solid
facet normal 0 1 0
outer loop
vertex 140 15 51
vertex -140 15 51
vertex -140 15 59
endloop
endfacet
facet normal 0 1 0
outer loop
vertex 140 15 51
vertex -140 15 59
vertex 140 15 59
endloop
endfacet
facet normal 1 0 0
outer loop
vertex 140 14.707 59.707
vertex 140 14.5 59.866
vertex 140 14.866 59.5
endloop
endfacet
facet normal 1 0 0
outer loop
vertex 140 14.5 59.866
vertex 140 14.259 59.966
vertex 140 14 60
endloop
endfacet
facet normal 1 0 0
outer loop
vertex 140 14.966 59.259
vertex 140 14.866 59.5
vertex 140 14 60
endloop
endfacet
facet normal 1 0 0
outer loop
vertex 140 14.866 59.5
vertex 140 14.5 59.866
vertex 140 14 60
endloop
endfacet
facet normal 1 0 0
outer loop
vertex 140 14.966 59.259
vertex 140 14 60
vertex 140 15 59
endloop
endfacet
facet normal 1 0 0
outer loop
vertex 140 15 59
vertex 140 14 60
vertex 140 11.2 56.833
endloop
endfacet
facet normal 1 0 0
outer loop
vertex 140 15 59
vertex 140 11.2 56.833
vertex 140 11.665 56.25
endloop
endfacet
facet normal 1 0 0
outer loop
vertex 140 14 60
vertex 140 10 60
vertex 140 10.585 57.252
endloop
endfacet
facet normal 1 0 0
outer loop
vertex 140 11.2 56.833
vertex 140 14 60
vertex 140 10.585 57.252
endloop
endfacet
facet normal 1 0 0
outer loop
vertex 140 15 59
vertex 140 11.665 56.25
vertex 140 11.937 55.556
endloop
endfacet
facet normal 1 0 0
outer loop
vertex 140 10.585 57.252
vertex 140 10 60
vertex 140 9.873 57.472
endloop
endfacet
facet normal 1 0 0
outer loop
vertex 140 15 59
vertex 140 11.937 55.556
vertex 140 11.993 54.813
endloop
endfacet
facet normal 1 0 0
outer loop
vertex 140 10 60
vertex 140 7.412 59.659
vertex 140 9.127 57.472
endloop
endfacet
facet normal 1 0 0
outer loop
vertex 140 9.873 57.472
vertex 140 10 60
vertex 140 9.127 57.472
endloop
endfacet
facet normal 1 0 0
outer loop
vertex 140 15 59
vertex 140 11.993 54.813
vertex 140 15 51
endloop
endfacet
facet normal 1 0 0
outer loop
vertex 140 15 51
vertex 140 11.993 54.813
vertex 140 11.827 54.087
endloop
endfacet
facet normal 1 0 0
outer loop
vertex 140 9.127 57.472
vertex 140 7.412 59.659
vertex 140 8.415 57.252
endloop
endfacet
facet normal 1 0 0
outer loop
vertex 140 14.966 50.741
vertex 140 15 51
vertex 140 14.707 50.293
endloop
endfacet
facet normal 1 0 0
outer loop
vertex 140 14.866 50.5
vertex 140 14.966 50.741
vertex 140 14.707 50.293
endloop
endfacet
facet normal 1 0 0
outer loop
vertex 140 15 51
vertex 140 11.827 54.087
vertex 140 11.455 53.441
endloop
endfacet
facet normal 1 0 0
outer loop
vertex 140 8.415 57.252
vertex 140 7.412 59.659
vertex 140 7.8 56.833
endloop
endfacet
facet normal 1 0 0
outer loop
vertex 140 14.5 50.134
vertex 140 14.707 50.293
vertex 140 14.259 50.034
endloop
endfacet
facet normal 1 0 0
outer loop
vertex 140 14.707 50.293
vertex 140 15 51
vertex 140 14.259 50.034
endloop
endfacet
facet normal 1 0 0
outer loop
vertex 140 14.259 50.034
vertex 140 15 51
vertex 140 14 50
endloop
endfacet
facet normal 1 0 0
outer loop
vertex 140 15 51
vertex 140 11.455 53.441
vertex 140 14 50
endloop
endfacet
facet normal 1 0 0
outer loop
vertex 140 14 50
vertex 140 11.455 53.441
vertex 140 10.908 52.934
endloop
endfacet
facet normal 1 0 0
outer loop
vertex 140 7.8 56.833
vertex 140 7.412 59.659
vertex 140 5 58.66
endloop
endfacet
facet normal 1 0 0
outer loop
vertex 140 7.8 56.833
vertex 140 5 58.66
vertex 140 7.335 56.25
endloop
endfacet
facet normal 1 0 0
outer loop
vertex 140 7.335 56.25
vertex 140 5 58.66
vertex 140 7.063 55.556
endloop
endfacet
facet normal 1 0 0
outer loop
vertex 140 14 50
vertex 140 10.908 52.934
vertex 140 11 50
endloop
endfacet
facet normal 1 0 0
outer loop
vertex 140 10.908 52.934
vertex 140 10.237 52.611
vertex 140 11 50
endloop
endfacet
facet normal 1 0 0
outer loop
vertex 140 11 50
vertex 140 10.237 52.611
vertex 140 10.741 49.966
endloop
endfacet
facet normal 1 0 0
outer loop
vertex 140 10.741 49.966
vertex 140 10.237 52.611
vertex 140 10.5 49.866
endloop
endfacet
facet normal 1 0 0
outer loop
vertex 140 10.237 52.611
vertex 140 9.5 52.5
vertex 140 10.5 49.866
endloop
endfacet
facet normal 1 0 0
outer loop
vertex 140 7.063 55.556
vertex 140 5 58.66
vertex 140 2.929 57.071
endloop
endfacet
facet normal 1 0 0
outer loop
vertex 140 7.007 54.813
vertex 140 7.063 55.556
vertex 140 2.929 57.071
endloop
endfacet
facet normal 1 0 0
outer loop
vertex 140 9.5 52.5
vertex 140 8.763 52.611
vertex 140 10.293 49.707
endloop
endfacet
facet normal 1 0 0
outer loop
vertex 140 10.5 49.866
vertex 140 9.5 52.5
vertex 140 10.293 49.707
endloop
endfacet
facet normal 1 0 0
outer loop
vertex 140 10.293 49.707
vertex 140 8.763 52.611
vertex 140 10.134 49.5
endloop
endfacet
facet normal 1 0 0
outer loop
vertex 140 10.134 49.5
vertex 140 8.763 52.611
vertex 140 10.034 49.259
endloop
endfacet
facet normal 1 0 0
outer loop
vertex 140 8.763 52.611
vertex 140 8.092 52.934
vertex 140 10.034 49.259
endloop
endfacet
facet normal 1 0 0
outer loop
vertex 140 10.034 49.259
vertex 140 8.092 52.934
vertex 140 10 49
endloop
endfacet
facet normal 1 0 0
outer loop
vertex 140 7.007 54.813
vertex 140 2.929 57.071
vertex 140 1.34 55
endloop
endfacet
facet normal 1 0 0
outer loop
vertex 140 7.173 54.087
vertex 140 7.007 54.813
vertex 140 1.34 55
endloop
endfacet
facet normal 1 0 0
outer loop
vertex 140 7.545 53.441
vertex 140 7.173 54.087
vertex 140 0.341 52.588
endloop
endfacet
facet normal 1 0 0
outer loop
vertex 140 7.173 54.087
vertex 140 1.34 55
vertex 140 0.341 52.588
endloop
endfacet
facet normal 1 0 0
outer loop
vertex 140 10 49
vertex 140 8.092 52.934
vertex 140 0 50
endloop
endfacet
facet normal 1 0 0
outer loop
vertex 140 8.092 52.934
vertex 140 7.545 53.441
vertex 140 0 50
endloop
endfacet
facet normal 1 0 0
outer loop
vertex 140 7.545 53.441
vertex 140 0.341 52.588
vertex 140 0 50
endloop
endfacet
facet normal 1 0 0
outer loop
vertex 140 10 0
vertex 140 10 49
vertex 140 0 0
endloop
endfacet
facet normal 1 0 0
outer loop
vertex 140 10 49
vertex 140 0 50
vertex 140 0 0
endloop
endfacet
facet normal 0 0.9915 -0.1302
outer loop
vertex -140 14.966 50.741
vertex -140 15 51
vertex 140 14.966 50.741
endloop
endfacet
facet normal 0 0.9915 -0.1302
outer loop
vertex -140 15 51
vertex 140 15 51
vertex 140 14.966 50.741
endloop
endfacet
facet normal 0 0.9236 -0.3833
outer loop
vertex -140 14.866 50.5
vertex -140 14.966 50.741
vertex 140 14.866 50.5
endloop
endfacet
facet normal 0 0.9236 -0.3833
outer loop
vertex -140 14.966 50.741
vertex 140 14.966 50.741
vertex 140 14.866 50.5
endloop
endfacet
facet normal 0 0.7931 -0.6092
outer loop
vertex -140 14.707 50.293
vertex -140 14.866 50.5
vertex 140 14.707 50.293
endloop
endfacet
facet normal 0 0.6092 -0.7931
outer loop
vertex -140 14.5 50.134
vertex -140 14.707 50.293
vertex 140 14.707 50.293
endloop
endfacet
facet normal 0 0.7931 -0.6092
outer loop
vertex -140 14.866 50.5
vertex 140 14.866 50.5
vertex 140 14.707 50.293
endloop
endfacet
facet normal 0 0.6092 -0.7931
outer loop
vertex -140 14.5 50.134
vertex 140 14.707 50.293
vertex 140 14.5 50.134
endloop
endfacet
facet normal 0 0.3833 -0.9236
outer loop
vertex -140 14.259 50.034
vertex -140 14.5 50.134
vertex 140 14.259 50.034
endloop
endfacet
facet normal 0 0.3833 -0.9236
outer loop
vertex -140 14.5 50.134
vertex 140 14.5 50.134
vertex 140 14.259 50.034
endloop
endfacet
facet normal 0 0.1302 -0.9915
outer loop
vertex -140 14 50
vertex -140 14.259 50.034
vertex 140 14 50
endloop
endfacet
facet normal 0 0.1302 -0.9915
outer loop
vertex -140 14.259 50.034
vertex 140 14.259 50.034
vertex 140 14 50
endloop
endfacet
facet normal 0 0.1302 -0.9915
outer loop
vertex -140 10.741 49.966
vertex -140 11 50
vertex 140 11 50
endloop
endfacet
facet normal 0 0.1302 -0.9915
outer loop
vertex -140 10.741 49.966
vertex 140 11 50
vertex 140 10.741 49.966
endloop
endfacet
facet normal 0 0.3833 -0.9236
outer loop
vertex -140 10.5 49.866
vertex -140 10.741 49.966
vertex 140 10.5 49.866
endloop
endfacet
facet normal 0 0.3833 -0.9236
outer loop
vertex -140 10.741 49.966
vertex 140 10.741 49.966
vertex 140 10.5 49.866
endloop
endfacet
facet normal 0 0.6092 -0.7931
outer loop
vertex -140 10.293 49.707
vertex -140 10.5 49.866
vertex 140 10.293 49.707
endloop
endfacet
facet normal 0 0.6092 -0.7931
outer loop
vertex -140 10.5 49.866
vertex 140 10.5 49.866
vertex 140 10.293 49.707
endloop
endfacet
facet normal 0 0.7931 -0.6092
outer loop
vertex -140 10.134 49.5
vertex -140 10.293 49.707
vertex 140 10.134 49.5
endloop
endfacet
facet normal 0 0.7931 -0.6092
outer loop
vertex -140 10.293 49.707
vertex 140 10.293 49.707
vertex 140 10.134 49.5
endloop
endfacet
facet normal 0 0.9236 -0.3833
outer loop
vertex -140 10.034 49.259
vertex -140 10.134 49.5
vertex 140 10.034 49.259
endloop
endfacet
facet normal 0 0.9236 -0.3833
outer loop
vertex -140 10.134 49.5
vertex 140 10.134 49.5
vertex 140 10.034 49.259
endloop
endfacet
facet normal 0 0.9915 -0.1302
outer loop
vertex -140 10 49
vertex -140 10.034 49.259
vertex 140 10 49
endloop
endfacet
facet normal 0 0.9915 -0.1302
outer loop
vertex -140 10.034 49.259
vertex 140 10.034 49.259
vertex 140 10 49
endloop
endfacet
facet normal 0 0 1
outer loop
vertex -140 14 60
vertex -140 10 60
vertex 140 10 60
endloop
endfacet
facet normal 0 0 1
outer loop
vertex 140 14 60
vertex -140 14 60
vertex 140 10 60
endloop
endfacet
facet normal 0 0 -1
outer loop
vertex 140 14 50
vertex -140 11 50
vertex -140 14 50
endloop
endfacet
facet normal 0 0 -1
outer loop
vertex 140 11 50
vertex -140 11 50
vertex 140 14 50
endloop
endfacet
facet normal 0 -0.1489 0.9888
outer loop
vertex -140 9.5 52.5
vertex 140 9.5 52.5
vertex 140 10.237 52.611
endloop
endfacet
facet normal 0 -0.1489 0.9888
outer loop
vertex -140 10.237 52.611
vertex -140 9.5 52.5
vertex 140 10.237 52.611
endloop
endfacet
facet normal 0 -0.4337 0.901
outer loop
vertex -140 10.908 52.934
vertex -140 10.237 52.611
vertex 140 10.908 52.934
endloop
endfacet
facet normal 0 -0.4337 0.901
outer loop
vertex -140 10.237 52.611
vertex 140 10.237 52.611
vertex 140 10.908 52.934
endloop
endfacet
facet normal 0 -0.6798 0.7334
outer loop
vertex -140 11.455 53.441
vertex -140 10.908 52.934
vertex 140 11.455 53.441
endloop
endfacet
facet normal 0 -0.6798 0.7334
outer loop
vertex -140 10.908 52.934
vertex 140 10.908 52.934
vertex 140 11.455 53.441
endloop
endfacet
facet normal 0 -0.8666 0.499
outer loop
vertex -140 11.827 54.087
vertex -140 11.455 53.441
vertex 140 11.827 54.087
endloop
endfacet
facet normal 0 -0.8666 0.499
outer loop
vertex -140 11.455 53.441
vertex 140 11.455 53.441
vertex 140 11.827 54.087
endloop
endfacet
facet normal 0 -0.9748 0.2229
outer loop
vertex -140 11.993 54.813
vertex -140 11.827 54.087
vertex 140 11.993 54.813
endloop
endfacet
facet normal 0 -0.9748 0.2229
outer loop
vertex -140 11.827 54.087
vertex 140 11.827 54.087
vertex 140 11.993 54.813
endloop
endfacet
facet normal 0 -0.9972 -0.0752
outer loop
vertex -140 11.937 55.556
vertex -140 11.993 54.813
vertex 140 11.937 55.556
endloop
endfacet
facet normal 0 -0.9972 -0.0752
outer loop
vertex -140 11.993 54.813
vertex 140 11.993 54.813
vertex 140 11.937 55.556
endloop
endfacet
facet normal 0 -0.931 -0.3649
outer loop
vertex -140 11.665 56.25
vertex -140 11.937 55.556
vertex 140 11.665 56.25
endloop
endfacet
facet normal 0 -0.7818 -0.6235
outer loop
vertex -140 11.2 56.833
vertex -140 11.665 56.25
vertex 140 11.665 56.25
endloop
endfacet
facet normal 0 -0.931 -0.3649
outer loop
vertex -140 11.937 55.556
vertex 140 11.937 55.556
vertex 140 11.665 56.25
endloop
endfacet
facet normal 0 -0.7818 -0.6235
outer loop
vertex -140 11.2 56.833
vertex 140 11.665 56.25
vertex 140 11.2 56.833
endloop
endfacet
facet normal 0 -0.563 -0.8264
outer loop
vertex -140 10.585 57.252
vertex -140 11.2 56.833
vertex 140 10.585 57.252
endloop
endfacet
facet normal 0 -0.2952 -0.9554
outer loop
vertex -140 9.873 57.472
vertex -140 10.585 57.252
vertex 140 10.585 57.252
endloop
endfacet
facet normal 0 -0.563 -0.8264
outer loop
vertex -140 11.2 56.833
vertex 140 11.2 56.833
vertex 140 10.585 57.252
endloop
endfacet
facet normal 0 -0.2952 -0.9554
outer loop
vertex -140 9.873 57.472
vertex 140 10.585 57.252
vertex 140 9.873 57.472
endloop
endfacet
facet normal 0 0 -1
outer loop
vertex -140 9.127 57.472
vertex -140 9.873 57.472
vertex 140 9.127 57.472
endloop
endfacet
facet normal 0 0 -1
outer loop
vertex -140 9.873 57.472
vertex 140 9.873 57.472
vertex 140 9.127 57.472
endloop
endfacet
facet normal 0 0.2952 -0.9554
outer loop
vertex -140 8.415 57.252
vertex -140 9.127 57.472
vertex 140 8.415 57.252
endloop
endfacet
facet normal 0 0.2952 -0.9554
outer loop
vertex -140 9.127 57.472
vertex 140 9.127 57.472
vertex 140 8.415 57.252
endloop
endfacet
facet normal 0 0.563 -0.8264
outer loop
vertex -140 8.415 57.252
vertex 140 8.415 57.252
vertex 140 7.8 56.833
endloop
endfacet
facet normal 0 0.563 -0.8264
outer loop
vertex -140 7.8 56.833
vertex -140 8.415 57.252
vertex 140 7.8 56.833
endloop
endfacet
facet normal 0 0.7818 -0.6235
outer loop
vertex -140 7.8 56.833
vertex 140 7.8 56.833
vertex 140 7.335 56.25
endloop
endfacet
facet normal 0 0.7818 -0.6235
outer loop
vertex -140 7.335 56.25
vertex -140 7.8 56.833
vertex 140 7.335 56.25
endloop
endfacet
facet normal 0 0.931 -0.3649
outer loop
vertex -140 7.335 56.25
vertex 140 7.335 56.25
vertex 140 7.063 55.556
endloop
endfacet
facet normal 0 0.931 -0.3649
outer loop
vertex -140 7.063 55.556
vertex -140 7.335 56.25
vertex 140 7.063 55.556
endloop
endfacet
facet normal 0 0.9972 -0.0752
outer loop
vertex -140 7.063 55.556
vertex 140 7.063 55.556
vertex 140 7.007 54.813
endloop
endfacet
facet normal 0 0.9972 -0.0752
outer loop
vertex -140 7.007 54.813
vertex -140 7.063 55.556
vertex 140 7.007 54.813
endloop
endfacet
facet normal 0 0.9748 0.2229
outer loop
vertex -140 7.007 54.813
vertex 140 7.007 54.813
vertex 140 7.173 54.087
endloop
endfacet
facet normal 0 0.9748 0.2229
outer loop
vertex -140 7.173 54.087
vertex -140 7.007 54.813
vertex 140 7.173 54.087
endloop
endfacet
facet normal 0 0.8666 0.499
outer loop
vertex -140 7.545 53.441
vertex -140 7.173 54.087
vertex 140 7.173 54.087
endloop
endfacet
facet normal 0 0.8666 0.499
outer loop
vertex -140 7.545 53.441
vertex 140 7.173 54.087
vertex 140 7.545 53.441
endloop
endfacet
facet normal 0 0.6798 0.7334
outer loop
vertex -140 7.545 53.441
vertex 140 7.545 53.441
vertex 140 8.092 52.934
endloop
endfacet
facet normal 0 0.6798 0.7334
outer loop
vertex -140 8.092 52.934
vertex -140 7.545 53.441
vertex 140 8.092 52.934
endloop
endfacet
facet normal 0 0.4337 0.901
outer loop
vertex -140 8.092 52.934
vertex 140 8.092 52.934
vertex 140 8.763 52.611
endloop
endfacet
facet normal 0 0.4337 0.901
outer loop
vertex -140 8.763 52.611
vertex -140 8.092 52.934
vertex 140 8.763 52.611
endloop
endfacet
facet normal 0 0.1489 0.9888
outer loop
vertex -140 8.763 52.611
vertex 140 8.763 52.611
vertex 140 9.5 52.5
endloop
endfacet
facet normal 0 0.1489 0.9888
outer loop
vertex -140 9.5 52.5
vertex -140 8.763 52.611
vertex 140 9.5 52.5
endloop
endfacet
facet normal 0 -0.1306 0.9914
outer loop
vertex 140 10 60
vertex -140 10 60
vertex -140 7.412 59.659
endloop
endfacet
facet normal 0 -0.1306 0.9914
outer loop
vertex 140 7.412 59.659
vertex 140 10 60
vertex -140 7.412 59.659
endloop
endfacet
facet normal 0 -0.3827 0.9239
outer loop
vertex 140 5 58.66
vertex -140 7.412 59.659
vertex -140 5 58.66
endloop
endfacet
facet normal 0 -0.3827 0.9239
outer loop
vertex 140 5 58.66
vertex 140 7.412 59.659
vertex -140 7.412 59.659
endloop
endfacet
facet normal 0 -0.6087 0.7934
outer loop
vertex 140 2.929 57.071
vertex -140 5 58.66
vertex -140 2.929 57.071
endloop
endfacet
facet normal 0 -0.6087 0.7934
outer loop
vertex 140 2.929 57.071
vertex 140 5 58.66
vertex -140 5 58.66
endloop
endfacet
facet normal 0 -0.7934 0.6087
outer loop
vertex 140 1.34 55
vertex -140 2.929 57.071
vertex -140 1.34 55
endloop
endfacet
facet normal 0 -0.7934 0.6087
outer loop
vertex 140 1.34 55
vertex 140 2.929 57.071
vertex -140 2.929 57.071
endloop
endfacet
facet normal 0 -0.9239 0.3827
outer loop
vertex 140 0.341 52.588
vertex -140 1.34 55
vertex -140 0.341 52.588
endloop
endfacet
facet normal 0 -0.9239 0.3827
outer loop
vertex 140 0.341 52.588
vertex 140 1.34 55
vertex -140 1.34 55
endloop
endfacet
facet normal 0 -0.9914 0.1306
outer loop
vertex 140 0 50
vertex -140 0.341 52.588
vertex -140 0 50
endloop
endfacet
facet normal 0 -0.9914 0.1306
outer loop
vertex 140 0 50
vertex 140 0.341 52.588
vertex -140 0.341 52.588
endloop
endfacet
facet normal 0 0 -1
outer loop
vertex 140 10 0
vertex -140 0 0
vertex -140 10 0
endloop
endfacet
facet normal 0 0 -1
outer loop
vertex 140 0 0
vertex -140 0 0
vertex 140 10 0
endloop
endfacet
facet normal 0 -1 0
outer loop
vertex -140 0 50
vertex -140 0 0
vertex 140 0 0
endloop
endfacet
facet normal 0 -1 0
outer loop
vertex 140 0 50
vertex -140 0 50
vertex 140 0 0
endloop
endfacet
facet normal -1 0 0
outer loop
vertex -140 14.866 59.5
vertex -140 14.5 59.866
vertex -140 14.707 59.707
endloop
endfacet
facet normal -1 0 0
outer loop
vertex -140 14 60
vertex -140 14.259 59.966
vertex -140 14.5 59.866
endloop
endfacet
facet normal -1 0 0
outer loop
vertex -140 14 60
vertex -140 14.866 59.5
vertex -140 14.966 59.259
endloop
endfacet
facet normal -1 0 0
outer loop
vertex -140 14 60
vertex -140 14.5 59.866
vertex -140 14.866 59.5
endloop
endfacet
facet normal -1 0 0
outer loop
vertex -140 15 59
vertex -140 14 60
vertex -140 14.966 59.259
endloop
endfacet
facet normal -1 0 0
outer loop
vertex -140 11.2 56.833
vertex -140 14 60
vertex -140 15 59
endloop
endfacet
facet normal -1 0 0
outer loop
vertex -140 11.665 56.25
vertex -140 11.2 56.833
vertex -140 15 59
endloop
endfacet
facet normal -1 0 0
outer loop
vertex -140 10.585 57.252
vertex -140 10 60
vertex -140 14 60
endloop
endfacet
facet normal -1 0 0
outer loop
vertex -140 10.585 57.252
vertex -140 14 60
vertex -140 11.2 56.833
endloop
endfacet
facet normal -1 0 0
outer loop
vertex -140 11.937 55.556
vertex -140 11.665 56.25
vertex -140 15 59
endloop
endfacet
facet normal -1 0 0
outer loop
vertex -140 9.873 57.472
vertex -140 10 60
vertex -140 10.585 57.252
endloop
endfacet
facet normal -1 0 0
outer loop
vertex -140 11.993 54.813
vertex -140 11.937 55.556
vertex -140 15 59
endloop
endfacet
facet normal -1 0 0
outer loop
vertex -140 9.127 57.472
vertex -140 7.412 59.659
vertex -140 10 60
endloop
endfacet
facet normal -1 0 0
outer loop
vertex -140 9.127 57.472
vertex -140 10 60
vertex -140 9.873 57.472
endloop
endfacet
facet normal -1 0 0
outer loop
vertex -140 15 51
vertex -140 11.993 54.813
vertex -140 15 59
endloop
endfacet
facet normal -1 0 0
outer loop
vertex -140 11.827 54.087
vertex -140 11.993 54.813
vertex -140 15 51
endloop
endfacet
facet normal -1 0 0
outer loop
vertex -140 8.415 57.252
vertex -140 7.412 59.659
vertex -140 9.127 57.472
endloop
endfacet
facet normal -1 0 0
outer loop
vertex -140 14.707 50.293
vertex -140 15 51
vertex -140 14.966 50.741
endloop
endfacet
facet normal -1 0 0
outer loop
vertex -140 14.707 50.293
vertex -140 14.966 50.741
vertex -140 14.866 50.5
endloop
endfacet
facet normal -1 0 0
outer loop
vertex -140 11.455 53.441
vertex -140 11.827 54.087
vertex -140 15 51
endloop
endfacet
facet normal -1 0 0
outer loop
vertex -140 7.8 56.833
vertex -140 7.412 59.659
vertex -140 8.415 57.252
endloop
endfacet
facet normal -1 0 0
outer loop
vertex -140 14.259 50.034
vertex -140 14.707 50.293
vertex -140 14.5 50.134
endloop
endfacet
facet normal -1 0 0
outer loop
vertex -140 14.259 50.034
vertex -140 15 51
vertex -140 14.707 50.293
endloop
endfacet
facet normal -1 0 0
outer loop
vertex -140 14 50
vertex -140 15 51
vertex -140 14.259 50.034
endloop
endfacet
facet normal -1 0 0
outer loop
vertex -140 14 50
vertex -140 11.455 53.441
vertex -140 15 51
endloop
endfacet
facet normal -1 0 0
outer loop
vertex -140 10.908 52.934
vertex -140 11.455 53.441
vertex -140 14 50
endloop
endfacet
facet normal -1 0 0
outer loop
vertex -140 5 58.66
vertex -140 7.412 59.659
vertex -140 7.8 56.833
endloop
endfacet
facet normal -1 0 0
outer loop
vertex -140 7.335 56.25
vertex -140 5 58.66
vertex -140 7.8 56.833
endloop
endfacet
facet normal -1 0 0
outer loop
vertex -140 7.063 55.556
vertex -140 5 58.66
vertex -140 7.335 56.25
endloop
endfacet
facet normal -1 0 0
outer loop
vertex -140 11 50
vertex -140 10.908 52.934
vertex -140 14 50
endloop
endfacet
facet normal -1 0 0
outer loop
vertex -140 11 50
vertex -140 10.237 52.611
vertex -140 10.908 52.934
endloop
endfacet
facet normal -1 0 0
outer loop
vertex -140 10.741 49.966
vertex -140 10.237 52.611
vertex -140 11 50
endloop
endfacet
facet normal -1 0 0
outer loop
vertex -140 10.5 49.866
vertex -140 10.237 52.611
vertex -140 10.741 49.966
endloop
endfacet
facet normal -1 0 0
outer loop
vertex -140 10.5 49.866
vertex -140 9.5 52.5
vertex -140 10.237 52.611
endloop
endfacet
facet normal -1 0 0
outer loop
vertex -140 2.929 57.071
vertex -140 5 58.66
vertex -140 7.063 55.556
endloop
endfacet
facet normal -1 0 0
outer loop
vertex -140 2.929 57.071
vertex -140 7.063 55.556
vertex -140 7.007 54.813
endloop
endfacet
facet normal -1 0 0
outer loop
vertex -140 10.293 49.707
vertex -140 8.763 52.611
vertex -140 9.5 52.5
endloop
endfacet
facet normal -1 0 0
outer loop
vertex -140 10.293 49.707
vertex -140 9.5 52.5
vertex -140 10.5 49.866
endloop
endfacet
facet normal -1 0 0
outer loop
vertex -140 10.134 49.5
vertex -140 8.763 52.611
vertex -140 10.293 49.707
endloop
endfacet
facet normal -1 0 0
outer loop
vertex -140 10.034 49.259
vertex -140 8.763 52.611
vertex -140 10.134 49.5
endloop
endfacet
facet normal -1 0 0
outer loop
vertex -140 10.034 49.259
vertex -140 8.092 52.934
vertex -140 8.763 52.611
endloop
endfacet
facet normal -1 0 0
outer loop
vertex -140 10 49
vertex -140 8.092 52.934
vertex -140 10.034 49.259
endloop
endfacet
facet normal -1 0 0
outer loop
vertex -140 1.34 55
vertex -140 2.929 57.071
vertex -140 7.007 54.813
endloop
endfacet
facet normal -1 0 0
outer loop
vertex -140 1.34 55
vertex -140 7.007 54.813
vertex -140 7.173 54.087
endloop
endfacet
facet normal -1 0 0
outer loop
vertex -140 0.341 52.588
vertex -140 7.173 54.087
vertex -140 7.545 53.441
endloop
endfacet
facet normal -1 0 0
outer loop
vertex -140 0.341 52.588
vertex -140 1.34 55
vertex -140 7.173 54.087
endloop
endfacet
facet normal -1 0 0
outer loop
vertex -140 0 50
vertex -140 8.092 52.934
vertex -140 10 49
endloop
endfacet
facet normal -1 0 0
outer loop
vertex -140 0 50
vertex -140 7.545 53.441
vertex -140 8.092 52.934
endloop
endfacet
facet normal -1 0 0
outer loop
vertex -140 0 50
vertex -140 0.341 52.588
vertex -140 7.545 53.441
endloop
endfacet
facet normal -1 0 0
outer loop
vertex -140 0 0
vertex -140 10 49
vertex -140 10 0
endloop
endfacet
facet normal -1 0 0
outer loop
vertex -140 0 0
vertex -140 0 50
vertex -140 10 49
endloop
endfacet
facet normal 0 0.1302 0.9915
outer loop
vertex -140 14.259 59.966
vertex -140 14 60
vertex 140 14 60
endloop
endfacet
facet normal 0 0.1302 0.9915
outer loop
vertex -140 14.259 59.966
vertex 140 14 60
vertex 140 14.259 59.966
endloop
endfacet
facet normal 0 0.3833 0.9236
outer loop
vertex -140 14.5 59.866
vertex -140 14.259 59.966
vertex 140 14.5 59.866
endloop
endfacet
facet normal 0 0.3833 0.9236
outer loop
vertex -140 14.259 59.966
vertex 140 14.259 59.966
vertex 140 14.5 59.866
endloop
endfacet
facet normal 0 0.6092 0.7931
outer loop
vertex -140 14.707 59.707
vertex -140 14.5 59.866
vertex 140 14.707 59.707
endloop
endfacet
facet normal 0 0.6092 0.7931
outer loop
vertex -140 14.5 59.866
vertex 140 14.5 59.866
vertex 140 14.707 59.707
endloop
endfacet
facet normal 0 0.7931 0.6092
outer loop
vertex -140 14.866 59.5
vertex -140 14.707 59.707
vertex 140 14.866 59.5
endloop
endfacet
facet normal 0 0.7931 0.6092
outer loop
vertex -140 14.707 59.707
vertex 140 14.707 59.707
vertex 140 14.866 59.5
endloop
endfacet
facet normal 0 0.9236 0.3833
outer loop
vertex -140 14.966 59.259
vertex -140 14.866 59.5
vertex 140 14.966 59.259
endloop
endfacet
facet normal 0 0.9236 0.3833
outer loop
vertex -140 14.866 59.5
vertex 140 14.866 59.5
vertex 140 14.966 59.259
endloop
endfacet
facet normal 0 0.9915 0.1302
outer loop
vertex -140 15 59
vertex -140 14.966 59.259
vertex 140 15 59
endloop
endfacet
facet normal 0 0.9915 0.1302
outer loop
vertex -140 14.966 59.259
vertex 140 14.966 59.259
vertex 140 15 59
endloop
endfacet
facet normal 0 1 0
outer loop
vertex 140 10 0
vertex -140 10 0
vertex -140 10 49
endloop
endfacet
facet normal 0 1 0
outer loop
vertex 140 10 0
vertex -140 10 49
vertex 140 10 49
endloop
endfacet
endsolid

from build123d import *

# Parameters (mm, degrees)
SKETCH1_W           = 280
SKETCH1_H           = 60
BOSS_EXTRUDE1_DEPTH = 10
SKETCH2_W           = 280
SKETCH2_H           = 10
BOSS_EXTRUDE2_DEPTH = 5
SKETCH3_R           = 2.5
CUT_EXTRUDE1_DEPTH  = 287.749019179
FILLET1_R           = 10
FILLET2_R           = 1
FILLET3_R           = 1
FILLET4_R           = 1


with BuildPart() as part:
    # Sketch1 → Boss-Extrude1 (new body)
    with BuildSketch(Plane(origin=(0, 0, 0), x_dir=(1, 0, 0), z_dir=(0, 1, 0))):
        with Locations((0, -30)):
            Rectangle(SKETCH1_W, SKETCH1_H)
    extrude(amount=BOSS_EXTRUDE1_DEPTH)

    # Sketch2 → Boss-Extrude2 (add)
    with BuildSketch(Plane(origin=(0, 10, 0), x_dir=(1, 0, 0), z_dir=(0, 1, 0))):
        with Locations((0, -55)):
            Rectangle(SKETCH2_W, SKETCH2_H)
    extrude(amount=BOSS_EXTRUDE2_DEPTH)

    # Sketch3 → Cut-Extrude1 (cut, through all)
    with BuildSketch(Plane(origin=(140, 0, 0), x_dir=(0, 0, -1), z_dir=(1, 0, 0))):
        with Locations((-55, 9.5)):
            Circle(SKETCH3_R)
    extrude(amount=-CUT_EXTRUDE1_DEPTH, mode=Mode.SUBTRACT)

    # Fillet1
    fillet1_edges = [part.edges().sort_by_distance(p)[0] for p in [
        (0, 0, 60),
    ]]
    fillet(fillet1_edges, radius=FILLET1_R)

    # Fillet2
    fillet2_edges = [part.edges().sort_by_distance(p)[0] for p in [
        (0, 15, 60),
    ]]
    fillet(fillet2_edges, radius=FILLET2_R)

    # Fillet3
    fillet3_edges = [part.edges().sort_by_distance(p)[0] for p in [
        (0, 15, 50),
    ]]
    fillet(fillet3_edges, radius=FILLET3_R)

    # Fillet4
    fillet4_edges = [part.edges().sort_by_distance(p)[0] for p in [
        (0, 10, 50),
    ]]
    fillet(fillet4_edges, radius=FILLET4_R)


solid = part.part
